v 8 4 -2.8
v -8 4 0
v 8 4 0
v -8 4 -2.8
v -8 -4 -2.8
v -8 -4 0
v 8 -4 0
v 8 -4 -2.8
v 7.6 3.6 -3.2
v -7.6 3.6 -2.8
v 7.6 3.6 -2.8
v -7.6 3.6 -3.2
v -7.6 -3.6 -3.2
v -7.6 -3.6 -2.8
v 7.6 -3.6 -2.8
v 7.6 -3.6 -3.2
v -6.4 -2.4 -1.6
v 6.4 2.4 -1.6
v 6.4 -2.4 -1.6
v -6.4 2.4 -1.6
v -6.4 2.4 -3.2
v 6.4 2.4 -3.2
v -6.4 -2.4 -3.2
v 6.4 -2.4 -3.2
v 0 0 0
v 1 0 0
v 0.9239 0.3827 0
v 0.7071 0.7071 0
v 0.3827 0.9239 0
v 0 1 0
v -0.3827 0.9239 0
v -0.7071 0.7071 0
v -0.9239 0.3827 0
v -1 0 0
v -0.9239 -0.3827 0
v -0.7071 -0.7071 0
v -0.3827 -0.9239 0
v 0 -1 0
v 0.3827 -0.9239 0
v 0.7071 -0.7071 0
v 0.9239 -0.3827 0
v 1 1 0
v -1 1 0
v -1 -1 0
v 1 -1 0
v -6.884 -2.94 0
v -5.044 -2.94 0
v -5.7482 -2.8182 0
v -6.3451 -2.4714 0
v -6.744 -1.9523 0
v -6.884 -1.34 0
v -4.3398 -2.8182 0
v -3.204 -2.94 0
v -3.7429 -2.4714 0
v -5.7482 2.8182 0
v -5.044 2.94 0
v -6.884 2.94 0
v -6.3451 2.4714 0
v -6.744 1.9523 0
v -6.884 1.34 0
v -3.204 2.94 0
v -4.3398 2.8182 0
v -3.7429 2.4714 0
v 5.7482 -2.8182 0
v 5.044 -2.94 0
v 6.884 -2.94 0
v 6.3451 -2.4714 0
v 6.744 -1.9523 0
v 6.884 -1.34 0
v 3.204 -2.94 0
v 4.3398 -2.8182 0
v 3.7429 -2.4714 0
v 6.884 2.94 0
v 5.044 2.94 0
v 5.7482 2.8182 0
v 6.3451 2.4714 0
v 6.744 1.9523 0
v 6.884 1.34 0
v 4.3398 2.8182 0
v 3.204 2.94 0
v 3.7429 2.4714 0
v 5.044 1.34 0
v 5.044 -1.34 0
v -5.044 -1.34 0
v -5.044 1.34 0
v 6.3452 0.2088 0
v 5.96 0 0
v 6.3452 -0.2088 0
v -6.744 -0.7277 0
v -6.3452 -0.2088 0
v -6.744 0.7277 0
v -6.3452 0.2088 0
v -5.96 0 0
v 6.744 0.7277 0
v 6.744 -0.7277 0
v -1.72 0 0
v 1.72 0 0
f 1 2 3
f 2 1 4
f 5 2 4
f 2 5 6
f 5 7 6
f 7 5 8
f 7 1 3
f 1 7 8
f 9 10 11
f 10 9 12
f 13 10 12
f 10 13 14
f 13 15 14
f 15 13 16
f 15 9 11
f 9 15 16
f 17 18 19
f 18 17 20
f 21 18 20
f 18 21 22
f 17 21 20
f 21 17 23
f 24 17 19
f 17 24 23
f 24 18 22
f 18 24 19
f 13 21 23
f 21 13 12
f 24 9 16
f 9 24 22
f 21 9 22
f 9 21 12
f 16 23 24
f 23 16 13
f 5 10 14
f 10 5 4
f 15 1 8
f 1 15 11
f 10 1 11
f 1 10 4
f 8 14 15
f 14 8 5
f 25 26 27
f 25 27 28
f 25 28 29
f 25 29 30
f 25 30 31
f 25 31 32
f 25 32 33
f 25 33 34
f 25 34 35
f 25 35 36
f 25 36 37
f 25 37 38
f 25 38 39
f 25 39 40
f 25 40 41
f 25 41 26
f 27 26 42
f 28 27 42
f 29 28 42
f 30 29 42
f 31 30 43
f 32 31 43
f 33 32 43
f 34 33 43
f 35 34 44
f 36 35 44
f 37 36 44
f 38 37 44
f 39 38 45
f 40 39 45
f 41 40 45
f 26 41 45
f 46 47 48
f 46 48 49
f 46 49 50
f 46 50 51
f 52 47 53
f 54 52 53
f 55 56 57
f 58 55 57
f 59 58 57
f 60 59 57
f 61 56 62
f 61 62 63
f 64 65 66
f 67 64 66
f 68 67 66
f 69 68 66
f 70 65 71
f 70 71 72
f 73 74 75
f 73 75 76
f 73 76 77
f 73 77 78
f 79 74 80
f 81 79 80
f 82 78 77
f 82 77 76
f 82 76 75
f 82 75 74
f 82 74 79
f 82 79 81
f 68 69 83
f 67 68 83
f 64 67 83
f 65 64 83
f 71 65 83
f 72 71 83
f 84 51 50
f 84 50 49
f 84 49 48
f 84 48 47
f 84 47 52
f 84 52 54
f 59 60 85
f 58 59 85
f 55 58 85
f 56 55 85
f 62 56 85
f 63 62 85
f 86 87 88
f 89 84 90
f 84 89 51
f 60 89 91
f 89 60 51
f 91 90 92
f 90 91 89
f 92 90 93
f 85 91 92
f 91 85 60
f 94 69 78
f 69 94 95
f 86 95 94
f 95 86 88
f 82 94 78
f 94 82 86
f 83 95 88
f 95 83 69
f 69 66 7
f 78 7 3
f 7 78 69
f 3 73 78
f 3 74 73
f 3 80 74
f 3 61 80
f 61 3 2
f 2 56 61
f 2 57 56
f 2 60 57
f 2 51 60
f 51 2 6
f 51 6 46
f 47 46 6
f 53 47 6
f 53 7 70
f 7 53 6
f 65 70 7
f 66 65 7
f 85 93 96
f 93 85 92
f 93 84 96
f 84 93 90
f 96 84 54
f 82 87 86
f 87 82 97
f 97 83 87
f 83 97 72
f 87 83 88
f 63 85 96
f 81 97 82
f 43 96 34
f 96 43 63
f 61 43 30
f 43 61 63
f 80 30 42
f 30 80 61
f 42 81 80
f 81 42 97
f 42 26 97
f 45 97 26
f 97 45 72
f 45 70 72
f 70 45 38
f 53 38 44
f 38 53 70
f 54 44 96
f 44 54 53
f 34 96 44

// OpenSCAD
// file: ../p/4-4edge.scad
use <../lib.scad>
$fa=1; $fs=0.2;
function ldraw_lib__4_4edge(realsolid=false) = [
// 0 Circle 1.0
// 0 Name: 4-4edge.dat
// 0 Author: James Jessiman
// 0 !LDRAW_ORG Primitive UPDATE 2017-01
// 0 !LICENSE Licensed under CC BY 2.0 and CC BY 4.0 : see CAreadme.txt
// 
// 0 BFC CERTIFY CCW
  [0,"BFC","CERTIFY"],
  [0,"BFC","CCW"],
// 
// 0 !HISTORY 1998-12-15 [PTadmin] Official Update 1998-10
// 0 !HISTORY 2005-12-28 [PTadmin] Official Update 2005-01
// 0 !HISTORY 2007-06-24 [PTadmin] Header formatted for Contributor Agreement
// 0 !HISTORY 2008-07-01 [PTadmin] Official Update 2008-01
// 0 !HISTORY 2017-01-15 [Steffen] BFCed
// 0 !HISTORY 2017-12-30 [PTadmin] Official Update 2017-01
// 
// 
// 2 24 1 0 0 0.9239 0 0.3827
  [2,24,1,0,0,0.9239,0,0.3827],
// 2 24 0.9239 0 0.3827 0.7071 0 0.7071
  [2,24,0.9239,0,0.3827,0.7071,0,0.7071],
// 2 24 0.7071 0 0.7071 0.3827 0 0.9239
  [2,24,0.7071,0,0.7071,0.3827,0,0.9239],
// 2 24 0.3827 0 0.9239 0 0 1
  [2,24,0.3827,0,0.9239,0,0,1],
// 2 24 0 0 1 -0.3827 0 0.9239
  [2,24,0,0,1,-0.3827,0,0.9239],
// 2 24 -0.3827 0 0.9239 -0.7071 0 0.7071
  [2,24,-0.3827,0,0.9239,-0.7071,0,0.7071],
// 2 24 -0.7071 0 0.7071 -0.9239 0 0.3827
  [2,24,-0.7071,0,0.7071,-0.9239,0,0.3827],
// 2 24 -0.9239 0 0.3827 -1 0 -0
  [2,24,-0.9239,0,0.3827,-1,0,-0],
// 2 24 -1 0 -0 -0.9239 0 -0.3827
  [2,24,-1,0,-0,-0.9239,0,-0.3827],
// 2 24 -0.9239 0 -0.3827 -0.7071 0 -0.7071
  [2,24,-0.9239,0,-0.3827,-0.7071,0,-0.7071],
// 2 24 -0.7071 0 -0.7071 -0.3827 0 -0.9239
  [2,24,-0.7071,0,-0.7071,-0.3827,0,-0.9239],
// 2 24 -0.3827 0 -0.9239 0 0 -1
  [2,24,-0.3827,0,-0.9239,0,0,-1],
// 2 24 0 0 -1 0.3827 0 -0.9239
  [2,24,0,0,-1,0.3827,0,-0.9239],
// 2 24 0.3827 0 -0.9239 0.7071 0 -0.7071
  [2,24,0.3827,0,-0.9239,0.7071,0,-0.7071],
// 2 24 0.7071 0 -0.7071 0.9239 0 -0.3827
  [2,24,0.7071,0,-0.7071,0.9239,0,-0.3827],
// 2 24 0.9239 0 -0.3827 1 0 0
  [2,24,0.9239,0,-0.3827,1,0,0],
];
module ldraw_lib__4_4edge(step=0, col=false, unit=2/5, alt=false, line=0.2, solid=!$preview)
    makepoly(ldraw_lib__4_4edge(solid), step=step, col=col, unit=unit, alt=alt, line=line, solid=solid);
ldraw_lib__4_4edge(line=0.2);
// file: ../p/4-4cyli.scad
use <../lib.scad>
$fa=1; $fs=0.2;
function ldraw_lib__4_4cyli(realsolid=false) = [
// 0 Cylinder 1.0
// 0 Name: 4-4cyli.dat
// 0 Author: James Jessiman
// 0 !LDRAW_ORG Primitive UPDATE 2005-01
// 0 !LICENSE Licensed under CC BY 2.0 and CC BY 4.0 : see CAreadme.txt
// 
// 0 BFC CERTIFY CCW
  [0,"BFC","CERTIFY"],
  [0,"BFC","CCW"],
// 
// 0 !HISTORY 1998-12-15 [PTadmin] Official Update 1998-10
// 0 !HISTORY 2002-03-23 [sbliss] Added BFC statement; merged headers from files in distributions LDraw 0.27 and Complete.
// 0 !HISTORY 2002-04-25 [PTadmin] Official Update 2002-02
// 0 !HISTORY 2004-12-14 [guyvivan] BFC CCW
// 0 !HISTORY 2005-12-28 [PTadmin] Official Update 2005-01
// 0 !HISTORY 2007-06-24 [PTadmin] Header formatted for Contributor Agreement
// 0 !HISTORY 2008-07-01 [PTadmin] Official Update 2008-01
// 
// 
// 4 16 1 1 0 0.9239 1 0.3827 0.9239 0 0.3827 1 0 0
  [4,16,1,1,0,0.9239,1,0.3827,0.9239,0,0.3827,1,0,0],
// 5 24 1 0 0 1 1 0 0.9239 0 0.3827 0.9239 0 -0.3827
  [5,24,1,0,0,1,1,0,0.9239,0,0.3827,0.9239,0,-0.3827],
// 4 16 0.9239 1 0.3827 0.7071 1 0.7071 0.7071 0 0.7071 0.9239 0 0.3827
  [4,16,0.9239,1,0.3827,0.7071,1,0.7071,0.7071,0,0.7071,0.9239,0,0.3827],
// 5 24 0.9239 0 0.3827 0.9239 1 0.3827 0.7071 0 0.7071 1 0 0
  [5,24,0.9239,0,0.3827,0.9239,1,0.3827,0.7071,0,0.7071,1,0,0],
// 4 16 0.7071 1 0.7071 0.3827 1 0.9239 0.3827 0 0.9239 0.7071 0 0.7071
  [4,16,0.7071,1,0.7071,0.3827,1,0.9239,0.3827,0,0.9239,0.7071,0,0.7071],
// 5 24 0.7071 0 0.7071 0.7071 1 0.7071 0.3827 0 0.9239 0.9239 0 0.3827
  [5,24,0.7071,0,0.7071,0.7071,1,0.7071,0.3827,0,0.9239,0.9239,0,0.3827],
// 4 16 0.3827 1 0.9239 0 1 1 0 0 1 0.3827 0 0.9239
  [4,16,0.3827,1,0.9239,0,1,1,0,0,1,0.3827,0,0.9239],
// 5 24 0.3827 0 0.9239 0.3827 1 0.9239 0 0 1 0.7071 0 0.7071
  [5,24,0.3827,0,0.9239,0.3827,1,0.9239,0,0,1,0.7071,0,0.7071],
// 4 16 0 1 1 -0.3827 1 0.9239 -0.3827 0 0.9239 0 0 1
  [4,16,0,1,1,-0.3827,1,0.9239,-0.3827,0,0.9239,0,0,1],
// 5 24 0 0 1 0 1 1 -0.3827 0 0.9239 0.3827 0 0.9239
  [5,24,0,0,1,0,1,1,-0.3827,0,0.9239,0.3827,0,0.9239],
// 4 16 -0.3827 1 0.9239 -0.7071 1 0.7071 -0.7071 0 0.7071 -0.3827 0 0.9239
  [4,16,-0.3827,1,0.9239,-0.7071,1,0.7071,-0.7071,0,0.7071,-0.3827,0,0.9239],
// 5 24 -0.3827 0 0.9239 -0.3827 1 0.9239 -0.7071 0 0.7071 0 0 1
  [5,24,-0.3827,0,0.9239,-0.3827,1,0.9239,-0.7071,0,0.7071,0,0,1],
// 4 16 -0.7071 1 0.7071 -0.9239 1 0.3827 -0.9239 0 0.3827 -0.7071 0 0.7071
  [4,16,-0.7071,1,0.7071,-0.9239,1,0.3827,-0.9239,0,0.3827,-0.7071,0,0.7071],
// 5 24 -0.7071 0 0.7071 -0.7071 1 0.7071 -0.9239 0 0.3827 -0.3827 0 0.9239
  [5,24,-0.7071,0,0.7071,-0.7071,1,0.7071,-0.9239,0,0.3827,-0.3827,0,0.9239],
// 4 16 -0.9239 1 0.3827 -1 1 0 -1 0 0 -0.9239 0 0.3827
  [4,16,-0.9239,1,0.3827,-1,1,0,-1,0,0,-0.9239,0,0.3827],
// 5 24 -0.9239 0 0.3827 -0.9239 1 0.3827 -1 0 0 -0.7071 0 0.7071
  [5,24,-0.9239,0,0.3827,-0.9239,1,0.3827,-1,0,0,-0.7071,0,0.7071],
// 4 16 -1 1 0 -0.9239 1 -0.3827 -0.9239 0 -0.3827 -1 0 0
  [4,16,-1,1,0,-0.9239,1,-0.3827,-0.9239,0,-0.3827,-1,0,0],
// 5 24 -1 0 0 -1 1 0 -0.9239 0 -0.3827 -0.9239 0 0.3827
  [5,24,-1,0,0,-1,1,0,-0.9239,0,-0.3827,-0.9239,0,0.3827],
// 4 16 -0.9239 1 -0.3827 -0.7071 1 -0.7071 -0.7071 0 -0.7071 -0.9239 0 -0.3827
  [4,16,-0.9239,1,-0.3827,-0.7071,1,-0.7071,-0.7071,0,-0.7071,-0.9239,0,-0.3827],
// 5 24 -0.9239 0 -0.3827 -0.9239 1 -0.3827 -0.7071 0 -0.7071 -1 0 0
  [5,24,-0.9239,0,-0.3827,-0.9239,1,-0.3827,-0.7071,0,-0.7071,-1,0,0],
// 4 16 -0.7071 1 -0.7071 -0.3827 1 -0.9239 -0.3827 0 -0.9239 -0.7071 0 -0.7071
  [4,16,-0.7071,1,-0.7071,-0.3827,1,-0.9239,-0.3827,0,-0.9239,-0.7071,0,-0.7071],
// 5 24 -0.7071 0 -0.7071 -0.7071 1 -0.7071 -0.3827 0 -0.9239 -0.9239 0 -0.3827
  [5,24,-0.7071,0,-0.7071,-0.7071,1,-0.7071,-0.3827,0,-0.9239,-0.9239,0,-0.3827],
// 4 16 -0.3827 1 -0.9239 0 1 -1 0 0 -1 -0.3827 0 -0.9239
  [4,16,-0.3827,1,-0.9239,0,1,-1,0,0,-1,-0.3827,0,-0.9239],
// 5 24 -0.3827 0 -0.9239 -0.3827 1 -0.9239 0 0 -1 -0.7071 0 -0.7071
  [5,24,-0.3827,0,-0.9239,-0.3827,1,-0.9239,0,0,-1,-0.7071,0,-0.7071],
// 4 16 0 1 -1 0.3827 1 -0.9239 0.3827 0 -0.9239 0 0 -1
  [4,16,0,1,-1,0.3827,1,-0.9239,0.3827,0,-0.9239,0,0,-1],
// 5 24 0 0 -1 0 1 -1 0.3827 0 -0.9239 -0.3827 0 -0.9239
  [5,24,0,0,-1,0,1,-1,0.3827,0,-0.9239,-0.3827,0,-0.9239],
// 4 16 0.3827 1 -0.9239 0.7071 1 -0.7071 0.7071 0 -0.7071 0.3827 0 -0.9239
  [4,16,0.3827,1,-0.9239,0.7071,1,-0.7071,0.7071,0,-0.7071,0.3827,0,-0.9239],
// 5 24 0.3827 0 -0.9239 0.3827 1 -0.9239 0.7071 0 -0.7071 0 0 -1
  [5,24,0.3827,0,-0.9239,0.3827,1,-0.9239,0.7071,0,-0.7071,0,0,-1],
// 4 16 0.7071 1 -0.7071 0.9239 1 -0.3827 0.9239 0 -0.3827 0.7071 0 -0.7071
  [4,16,0.7071,1,-0.7071,0.9239,1,-0.3827,0.9239,0,-0.3827,0.7071,0,-0.7071],
// 5 24 0.7071 0 -0.7071 0.7071 1 -0.7071 0.9239 0 -0.3827 0.3827 0 -0.9239
  [5,24,0.7071,0,-0.7071,0.7071,1,-0.7071,0.9239,0,-0.3827,0.3827,0,-0.9239],
// 4 16 0.9239 1 -0.3827 1 1 0 1 0 0 0.9239 0 -0.3827
  [4,16,0.9239,1,-0.3827,1,1,0,1,0,0,0.9239,0,-0.3827],
// 5 24 0.9239 0 -0.3827 0.9239 1 -0.3827 1 0 0 0.7071 0 -0.7071
  [5,24,0.9239,0,-0.3827,0.9239,1,-0.3827,1,0,0,0.7071,0,-0.7071],
// 0
];
module ldraw_lib__4_4cyli(step=0, col=false, unit=2/5, alt=false, line=0.2, solid=!$preview)
    makepoly(ldraw_lib__4_4cyli(solid), step=step, col=col, unit=unit, alt=alt, line=line, solid=solid);
ldraw_lib__4_4cyli(line=0.2);
// file: ../p/stud3.scad
use <../lib.scad>
use <4-4cyli.scad>
use <4-4disc.scad>
use <4-4edge.scad>
$fa=1; $fs=0.2;
function ldraw_lib__stud3(realsolid=false) = realsolid ? 
    [openscad(translate([0,0,-eps()], o=cylinder(4+eps(), r=4)),2)] : [
// 0 Stud Tube Solid
// 0 Name: stud3.dat
// 0 Author: James Jessiman
// 0 !LDRAW_ORG Primitive UPDATE 2012-01
// 0 !LICENSE Licensed under CC BY 2.0 and CC BY 4.0 : see CAreadme.txt
// 
// 0 BFC CERTIFY CCW
  [0,"BFC","CERTIFY"],
  [0,"BFC","CCW"],
// 
// 0 !HISTORY 2002-04-04 [sbliss] Modified for BFC compliance
// 0 !HISTORY 2002-04-25 [PTadmin] Official Update 2002-02
// 0 !HISTORY 2007-06-24 [PTadmin] Header formatted for Contributor Agreement
// 0 !HISTORY 2008-07-01 [PTadmin] Official Update 2008-01
// 0 !HISTORY 2012-02-16 [Philo] Changed to CCW
// 0 !HISTORY 2012-03-30 [PTadmin] Official Update 2012-01
// 
// 
// 1 16 0 -4 0 4 0 0 0 1 0 0 0 4 4-4edge.dat
  [1,16,0,-4,0,4,0,0,0,1,0,0,0,4, ldraw_lib__4_4edge(realsolid)],
// 1 16 0 0 0 4 0 0 0 1 0 0 0 4 4-4edge.dat
  [1,16,0,0,0,4,0,0,0,1,0,0,0,4, ldraw_lib__4_4edge(realsolid)],
// 1 16 0 -4 0 4 0 0 0 1 0 0 0 4 4-4disc.dat
  [1,16,0,-4,0,4,0,0,0,1,0,0,0,4, ldraw_lib__4_4disc(realsolid)],
// 1 16 0 -4 0 4 0 0 0 4 0 0 0 4 4-4cyli.dat
  [1,16,0,-4,0,4,0,0,0,4,0,0,0,4, ldraw_lib__4_4cyli(realsolid)],
];
module ldraw_lib__stud3(step=0, col=false, unit=2/5, alt=false, line=0.2, solid=!$preview)
    makepoly(ldraw_lib__stud3(solid), step=step, col=col, unit=unit, alt=alt, line=line, solid=solid);
ldraw_lib__stud3(line=0.2);
// file: ../p/stud.scad
use <../lib.scad>
use <4-4cyli.scad>
use <4-4disc.scad>
use <4-4edge.scad>
$fa=1; $fs=0.2;
function ldraw_lib__stud(realsolid=false) = realsolid ? 
    [openscad(translate([0,0,-eps()], o=cylinder(4+eps(), r=6)),2)] : [
// 0 Stud
// 0 Name: stud.dat
// 0 Author: James Jessiman
// 0 !LDRAW_ORG Primitive UPDATE 2012-01
// 0 !LICENSE Licensed under CC BY 2.0 and CC BY 4.0 : see CAreadme.txt
// 
// 0 BFC CERTIFY CCW
  [0,"BFC","CERTIFY"],
  [0,"BFC","CCW"],
// 
// 0 !HISTORY 2002-04-04 [sbliss] Modified for BFC compliance
// 0 !HISTORY 2002-04-25 [PTadmin] Official Update 2002-02
// 0 !HISTORY 2007-06-24 [PTadmin] Header formatted for Contributor Agreement
// 0 !HISTORY 2008-07-01 [PTadmin] Official Update 2008-01
// 0 !HISTORY 2012-02-16 [Philo] Changed to CCW
// 0 !HISTORY 2012-03-30 [PTadmin] Official Update 2012-01
// 
// 
// 1 16 0 0 0 6 0 0 0 1 0 0 0 6 4-4edge.dat
  [1,16,0,0,0,6,0,0,0,1,0,0,0,6, ldraw_lib__4_4edge(realsolid)],
// 1 16 0 -4 0 6 0 0 0 1 0 0 0 6 4-4edge.dat
  [1,16,0,-4,0,6,0,0,0,1,0,0,0,6, ldraw_lib__4_4edge(realsolid)],
// 1 16 0 0 0 6 0 0 0 -4 0 0 0 6 4-4cyli.dat
  [1,16,0,0,0,6,0,0,0,-4,0,0,0,6, ldraw_lib__4_4cyli(realsolid)],
// 1 16 0 -4 0 6 0 0 0 1 0 0 0 6 4-4disc.dat
  [1,16,0,-4,0,6,0,0,0,1,0,0,0,6, ldraw_lib__4_4disc(realsolid)],
];
module ldraw_lib__stud(step=0, col=false, unit=2/5, alt=false, line=0.2, solid=!$preview)
    makepoly(ldraw_lib__stud(solid), step=step, col=col, unit=unit, alt=alt, line=line, solid=solid);
ldraw_lib__stud(line=0.2);
// file: ../p/box4t.scad
use <../lib.scad>
$fa=1; $fs=0.2;
function ldraw_lib__box4t(realsolid=false) = [
// 0 Box with 4 Adjacent Faces and All Edges
// 0 Name: box4t.dat
// 0 Author: Tore Eriksson [Tore_Eriksson]
// 0 !LDRAW_ORG Primitive UPDATE 2003-02
// 0 !LICENSE Licensed under CC BY 2.0 and CC BY 4.0 : see CAreadme.txt
// 
// 0 BFC CERTIFY CCW
  [0,"BFC","CERTIFY"],
  [0,"BFC","CCW"],
// 
// 0 !HISTORY 1997-09-29 [PTadmin] Official Update 1997-15
// 0 !HISTORY 2002-08-31 [izanette] Modified with WINDZ for BFC compliance
// 0 !HISTORY 2003-08-01 [PTadmin] Official Update 2003-02
// 0 !HISTORY 2007-06-24 [PTadmin] Header formatted for Contributor Agreement
// 0 !HISTORY 2008-07-01 [PTadmin] Official Update 2008-01
// 
// 
// 2 24 1 1 1 -1 1 1
  [2,24,1,1,1,-1,1,1],
// 2 24 -1 1 1 -1 1 -1
  [2,24,-1,1,1,-1,1,-1],
// 2 24 -1 1 -1 1 1 -1
  [2,24,-1,1,-1,1,1,-1],
// 2 24 1 1 -1 1 1 1
  [2,24,1,1,-1,1,1,1],
// 2 24 1 0 1 -1 0 1
  [2,24,1,0,1,-1,0,1],
// 2 24 -1 0 1 -1 0 -1
  [2,24,-1,0,1,-1,0,-1],
// 2 24 -1 0 -1 1 0 -1
  [2,24,-1,0,-1,1,0,-1],
// 2 24 1 0 -1 1 0 1
  [2,24,1,0,-1,1,0,1],
// 2 24 1 0 1 1 1 1
  [2,24,1,0,1,1,1,1],
// 2 24 -1 0 1 -1 1 1
  [2,24,-1,0,1,-1,1,1],
// 2 24 1 0 -1 1 1 -1
  [2,24,1,0,-1,1,1,-1],
// 2 24 -1 0 -1 -1 1 -1
  [2,24,-1,0,-1,-1,1,-1],
// 4 16 1 1 1 1 1 -1 -1 1 -1 -1 1 1
  [4,16,1,1,1,1,1,-1,-1,1,-1,-1,1,1],
// 4 16 1 1 1 -1 1 1 -1 0 1 1 0 1
  [4,16,1,1,1,-1,1,1,-1,0,1,1,0,1],
// 4 16 -1 1 1 -1 1 -1 -1 0 -1 -1 0 1
  [4,16,-1,1,1,-1,1,-1,-1,0,-1,-1,0,1],
// 0 4 16 -1 1 -1 -1 0 -1 1 0 -1 1 1 -1
// 4 16 1 1 -1 1 1 1 1 0 1 1 0 -1
  [4,16,1,1,-1,1,1,1,1,0,1,1,0,-1],
// 0
];
module ldraw_lib__box4t(step=0, col=false, unit=2/5, alt=false, line=0.2, solid=!$preview)
    makepoly(ldraw_lib__box4t(solid), step=step, col=col, unit=unit, alt=alt, line=line, solid=solid);
ldraw_lib__box4t(line=0.2);
// file: s/3004s01.scad
use <../../lib.scad>
use <../../p/box4t.scad>
use <../../p/box5.scad>
use <../../p/stud.scad>
use <../../p/stud3.scad>
$fa=1; $fs=0.2;
function ldraw_lib__s__3004s01(realsolid=false) = [
// 0 ~Brick  1 x  2 without Front Face
// 0 Name: s\3004s01.dat
// 0 Author: James Jessiman
// 0 !LDRAW_ORG Subpart UPDATE 2003-03
// 0 !LICENSE Licensed under CC BY 2.0 and CC BY 4.0 : see CAreadme.txt
// 
// 0 BFC CERTIFY CCW
  [0,"BFC","CERTIFY"],
  [0,"BFC","CCW"],
// 
// 0 !HISTORY 2003-09-07 [jriley] Subfiling, BFC
// 0 !HISTORY 2003-12-19 [PTadmin] Official Update 2003-03
// 0 !HISTORY 2007-08-29 [PTadmin] Header formatted for Contributor Agreement
// 0 !HISTORY 2008-07-01 [PTadmin] Official Update 2008-01
// 
// 
// 1 16 0 4 0 1 0 0 0 -5 0 0 0 1 stud3.dat
  [1,16,0,4,0,1,0,0,0,-5,0,0,0,1, ldraw_lib__stud3(realsolid)],
// 0 BFC INVERTNEXT
  [0,"BFC","INVERTNEXT"],
// 1 16 0 24 0 16 0 0 0 -20 0 0 0 6 box5.dat
  [1,16,0,24,0,16,0,0,0,-20,0,0,0,6, ldraw_lib__box5(realsolid)],
// 4 16 20 24 10 16 24 6 -16 24 6 -20 24 10
  [4,16,20,24,10,16,24,6,-16,24,6,-20,24,10],
// 4 16 -20 24 10 -16 24 6 -16 24 -6 -20 24 -10
  [4,16,-20,24,10,-16,24,6,-16,24,-6,-20,24,-10],
// 4 16 -20 24 -10 -16 24 -6 16 24 -6 20 24 -10
  [4,16,-20,24,-10,-16,24,-6,16,24,-6,20,24,-10],
// 4 16 20 24 -10 16 24 -6 16 24 6 20 24 10
  [4,16,20,24,-10,16,24,-6,16,24,6,20,24,10],
// 1 16 0 24 0 20 0 0 0 -24 0 0 0 10 box4t.dat
  [1,16,0,24,0,20,0,0,0,-24,0,0,0,10, ldraw_lib__box4t(realsolid)],
// 1 16 10 0 0 1 0 0 0 1 0 0 0 1 stud.dat
  [1,16,10,0,0,1,0,0,0,1,0,0,0,1, ldraw_lib__stud(realsolid)],
// 1 16 -10 0 0 1 0 0 0 1 0 0 0 1 stud.dat
  [1,16,-10,0,0,1,0,0,0,1,0,0,0,1, ldraw_lib__stud(realsolid)],
// 0
];
module ldraw_lib__s__3004s01(step=0, col=false, unit=2/5, alt=false, line=0.2, solid=!$preview)
    makepoly(ldraw_lib__s__3004s01(solid), step=step, col=col, unit=unit, alt=alt, line=line, solid=solid);
ldraw_lib__s__3004s01(line=0.2);
// file: ../p/box5.scad
use <../lib.scad>
$fa=1; $fs=0.2;
function ldraw_lib__box5(realsolid=false) = [
// 0 Box with 5 Faces and All Edges
// 0 Name: box5.dat
// 0 Author: James Jessiman
// 0 !LDRAW_ORG Primitive UPDATE 2012-01
// 0 !LICENSE Licensed under CC BY 2.0 and CC BY 4.0 : see CAreadme.txt
// 
// 0 BFC CERTIFY CCW
  [0,"BFC","CERTIFY"],
  [0,"BFC","CCW"],
// 
// 0 !HISTORY 2002-04-03 [sbliss] Modified for BFC compliance
// 0 !HISTORY 2002-04-25 [PTadmin] Official Update 2002-02
// 0 !HISTORY 2007-06-24 [PTadmin] Header formatted for Contributor Agreement
// 0 !HISTORY 2008-07-01 [PTadmin] Official Update 2008-01
// 0 !HISTORY 2012-02-16 [Philo] Changed to CCW
// 0 !HISTORY 2012-03-30 [PTadmin] Official Update 2012-01
// 
// 
// 2 24 1 1 1 -1 1 1
  [2,24,1,1,1,-1,1,1],
// 2 24 -1 1 1 -1 1 -1
  [2,24,-1,1,1,-1,1,-1],
// 2 24 -1 1 -1 1 1 -1
  [2,24,-1,1,-1,1,1,-1],
// 2 24 1 1 -1 1 1 1
  [2,24,1,1,-1,1,1,1],
// 2 24 1 0 1 -1 0 1
  [2,24,1,0,1,-1,0,1],
// 2 24 -1 0 1 -1 0 -1
  [2,24,-1,0,1,-1,0,-1],
// 2 24 -1 0 -1 1 0 -1
  [2,24,-1,0,-1,1,0,-1],
// 2 24 1 0 -1 1 0 1
  [2,24,1,0,-1,1,0,1],
// 2 24 1 0 1 1 1 1
  [2,24,1,0,1,1,1,1],
// 2 24 -1 0 1 -1 1 1
  [2,24,-1,0,1,-1,1,1],
// 2 24 1 0 -1 1 1 -1
  [2,24,1,0,-1,1,1,-1],
// 2 24 -1 0 -1 -1 1 -1
  [2,24,-1,0,-1,-1,1,-1],
// 4 16 -1 1 1 1 1 1 1 1 -1 -1 1 -1
  [4,16,-1,1,1,1,1,1,1,1,-1,-1,1,-1],
// 4 16 -1 1 1 -1 0 1 1 0 1 1 1 1
  [4,16,-1,1,1,-1,0,1,1,0,1,1,1,1],
// 4 16 -1 1 -1 -1 0 -1 -1 0 1 -1 1 1
  [4,16,-1,1,-1,-1,0,-1,-1,0,1,-1,1,1],
// 4 16 1 1 -1 1 0 -1 -1 0 -1 -1 1 -1
  [4,16,1,1,-1,1,0,-1,-1,0,-1,-1,1,-1],
// 4 16 1 1 1 1 0 1 1 0 -1 1 1 -1
  [4,16,1,1,1,1,0,1,1,0,-1,1,1,-1],
];
module ldraw_lib__box5(step=0, col=false, unit=2/5, alt=false, line=0.2, solid=!$preview)
    makepoly(ldraw_lib__box5(solid), step=step, col=col, unit=unit, alt=alt, line=line, solid=solid);
ldraw_lib__box5(line=0.2);
// file: ../p/box4.scad
use <../lib.scad>
$fa=1; $fs=0.2;
function ldraw_lib__box4(realsolid=false) = [
// 0 Box with 4 Faces (2 Parallel Pairs) and All Edges
// 0 Name: box4.dat
// 0 Author: James Jessiman
// 0 !LDRAW_ORG Primitive UPDATE 2012-01
// 0 !LICENSE Licensed under CC BY 2.0 and CC BY 4.0 : see CAreadme.txt
// 
// 0 BFC CERTIFY CCW
  [0,"BFC","CERTIFY"],
  [0,"BFC","CCW"],
// 
// 0 !HISTORY 2002-04-03 [sbliss] Modified for BFC compliance
// 0 !HISTORY 2002-04-25 [PTadmin] Official Update 2002-02
// 0 !HISTORY 2007-06-24 [PTadmin] Header formatted for Contributor Agreement
// 0 !HISTORY 2008-07-01 [PTadmin] Official Update 2008-01
// 0 !HISTORY 2012-02-16 [Philo] Changed to CCW
// 0 !HISTORY 2012-03-30 [PTadmin] Official Update 2012-01
// 
// 
// 2 24 1 1 1 -1 1 1
  [2,24,1,1,1,-1,1,1],
// 2 24 -1 1 1 -1 1 -1
  [2,24,-1,1,1,-1,1,-1],
// 2 24 -1 1 -1 1 1 -1
  [2,24,-1,1,-1,1,1,-1],
// 2 24 1 1 -1 1 1 1
  [2,24,1,1,-1,1,1,1],
// 2 24 1 0 1 -1 0 1
  [2,24,1,0,1,-1,0,1],
// 2 24 -1 0 1 -1 0 -1
  [2,24,-1,0,1,-1,0,-1],
// 2 24 -1 0 -1 1 0 -1
  [2,24,-1,0,-1,1,0,-1],
// 2 24 1 0 -1 1 0 1
  [2,24,1,0,-1,1,0,1],
// 2 24 1 0 1 1 1 1
  [2,24,1,0,1,1,1,1],
// 2 24 -1 0 1 -1 1 1
  [2,24,-1,0,1,-1,1,1],
// 2 24 1 0 -1 1 1 -1
  [2,24,1,0,-1,1,1,-1],
// 2 24 -1 0 -1 -1 1 -1
  [2,24,-1,0,-1,-1,1,-1],
// 4 16 -1 1 1 -1 0 1 1 0 1 1 1 1
  [4,16,-1,1,1,-1,0,1,1,0,1,1,1,1],
// 4 16 -1 1 -1 -1 0 -1 -1 0 1 -1 1 1
  [4,16,-1,1,-1,-1,0,-1,-1,0,1,-1,1,1],
// 4 16 1 1 -1 1 0 -1 -1 0 -1 -1 1 -1
  [4,16,1,1,-1,1,0,-1,-1,0,-1,-1,1,-1],
// 4 16 1 1 1 1 0 1 1 0 -1 1 1 -1
  [4,16,1,1,1,1,0,1,1,0,-1,1,1,-1],
];
module ldraw_lib__box4(step=0, col=false, unit=2/5, alt=false, line=0.2, solid=!$preview)
    makepoly(ldraw_lib__box4(solid), step=step, col=col, unit=unit, alt=alt, line=line, solid=solid);
ldraw_lib__box4(line=0.2);
// file: 3004.scad
use <../lib.scad>
use <s/3004s01.scad>
$fa=1; $fs=0.2;
function ldraw_lib__3004(realsolid=false) = [
// 0 Brick  1 x  2
// 0 Name: 3004.dat
// 0 Author: James Jessiman
// 0 !LDRAW_ORG Part UPDATE 2022-05
// 0 !LICENSE Licensed under CC BY 2.0 and CC BY 4.0 : see CAreadme.txt
// 
// 0 BFC CERTIFY CCW
  [0,"BFC","CERTIFY"],
  [0,"BFC","CCW"],
// 
// 0 !HISTORY 2001-10-26 [PTadmin] Official Update 2001-01
// 0 !HISTORY 2002-05-07 {unknown} BFC Certification
// 0 !HISTORY 2002-06-11 [PTadmin] Official Update 2002-03
// 0 !HISTORY 2007-05-07 [PTadmin] Header formatted for Contributor Agreement
// 0 !HISTORY 2008-07-01 [PTadmin] Official Update 2008-01
// 0 !HISTORY 2022-08-04 [MagFors] Using subfile
// 0 !HISTORY 2022-09-15 [PTadmin] Official Update 2022-05
// 
// 
// 1 16 0 0 0 1 0 0 0 1 0 0 0 1 s\3004s01.dat
  [1,16,0,0,0,1,0,0,0,1,0,0,0,1, ldraw_lib__s__3004s01(realsolid)],
// 4 16 -20 24 -10 20 24 -10 20 0 -10 -20 0 -10
  [4,16,-20,24,-10,20,24,-10,20,0,-10,-20,0,-10],
];
module ldraw_lib__3004(step=0, col=false, unit=2/5, alt=false, line=0.2, solid=!$preview)
    makepoly(ldraw_lib__3004(solid), step=step, col=col, unit=unit, alt=alt, line=line, solid=solid);
ldraw_lib__3004(line=0.2);
// file: s/3069bs01.scad
use <../../lib.scad>
use <../../p/box4.scad>
use <../../p/box5.scad>
$fa=1; $fs=0.2;
function ldraw_lib__s__3069bs01(realsolid=false) = [
// 0 ~Tile  1 x  2 with Groove without Top Face
// 0 Name: s\3069bs01.dat
// 0 Author: Santeri Piippo [arezey]
// 0 !LDRAW_ORG Subpart UPDATE 2010-02
// 0 !LICENSE Licensed under CC BY 2.0 and CC BY 4.0 : see CAreadme.txt
// 
// 0 BFC CERTIFY CCW
  [0,"BFC","CERTIFY"],
  [0,"BFC","CCW"],
// 
// 0 !HISTORY 2010-07-05 [PTadmin] Official Update 2010-02
// 
// 
// 1 16 0 0 0 20 0 0 0 7 0 0 0 10 box4.dat
  [1,16,0,0,0,20,0,0,0,7,0,0,0,10, ldraw_lib__box4(realsolid)],
// 1 16 0 7 0 19 0 0 0 1 0 0 0 9 box4.dat
  [1,16,0,7,0,19,0,0,0,1,0,0,0,9, ldraw_lib__box4(realsolid)],
// 0 BFC INVERTNEXT
  [0,"BFC","INVERTNEXT"],
// 1 16 0 8 0 16 0 0 0 -4 0 0 0 6 box5.dat
  [1,16,0,8,0,16,0,0,0,-4,0,0,0,6, ldraw_lib__box5(realsolid)],
// 4 16 -19 8 9 -16 8 6 -16 8 -6 -19 8 -9
  [4,16,-19,8,9,-16,8,6,-16,8,-6,-19,8,-9],
// 4 16 19 8 -9 16 8 -6 16 8 6 19 8 9
  [4,16,19,8,-9,16,8,-6,16,8,6,19,8,9],
// 4 16 19 8 9 16 8 6 -16 8 6 -19 8 9
  [4,16,19,8,9,16,8,6,-16,8,6,-19,8,9],
// 4 16 -19 8 -9 -16 8 -6 16 8 -6 19 8 -9
  [4,16,-19,8,-9,-16,8,-6,16,8,-6,19,8,-9],
// 4 16 -20 7 10 -19 7 9 -19 7 -9 -20 7 -10
  [4,16,-20,7,10,-19,7,9,-19,7,-9,-20,7,-10],
// 4 16 20 7 -10 19 7 -9 19 7 9 20 7 10
  [4,16,20,7,-10,19,7,-9,19,7,9,20,7,10],
// 4 16 20 7 10 19 7 9 -19 7 9 -20 7 10
  [4,16,20,7,10,19,7,9,-19,7,9,-20,7,10],
// 4 16 -20 7 -10 -19 7 -9 19 7 -9 20 7 -10
  [4,16,-20,7,-10,-19,7,-9,19,7,-9,20,7,-10],
// 0 //
];
module ldraw_lib__s__3069bs01(step=0, col=false, unit=2/5, alt=false, line=0.2, solid=!$preview)
    makepoly(ldraw_lib__s__3069bs01(solid), step=step, col=col, unit=unit, alt=alt, line=line, solid=solid);
ldraw_lib__s__3069bs01(line=0.2);
// file: ../p/4-4ndis.scad
use <../lib.scad>
$fa=1; $fs=0.2;
function ldraw_lib__4_4ndis(realsolid=false) = [
// 0 Disc Negative 1.0
// 0 Name: 4-4ndis.dat
// 0 Author: James Jessiman
// 0 !LDRAW_ORG Primitive UPDATE 2012-01
// 0 !LICENSE Licensed under CC BY 2.0 and CC BY 4.0 : see CAreadme.txt
// 
// 0 BFC CERTIFY CCW
  [0,"BFC","CERTIFY"],
  [0,"BFC","CCW"],
// 
// 0 !HISTORY 2002-03-23 [sbliss] Added BFC statement; compacted code
// 0 !HISTORY 2002-04-25 [PTadmin] Official Update 2002-02
// 0 !HISTORY 2007-06-24 [PTadmin] Header formatted for Contributor Agreement
// 0 !HISTORY 2008-07-01 [PTadmin] Official Update 2008-01
// 0 !HISTORY 2012-02-16 [Philo] Changed to CCW
// 0 !HISTORY 2012-03-30 [PTadmin] Official Update 2012-01
// 
// 
// 3 16 0.9239 0 0.3827 1 0 0 1 0 1
  [3,16,0.9239,0,0.3827,1,0,0,1,0,1],
// 3 16 0.7071 0 0.7071 0.9239 0 0.3827 1 0 1
  [3,16,0.7071,0,0.7071,0.9239,0,0.3827,1,0,1],
// 3 16 0.3827 0 0.9239 0.7071 0 0.7071 1 0 1
  [3,16,0.3827,0,0.9239,0.7071,0,0.7071,1,0,1],
// 3 16 0 0 1 0.3827 0 0.9239 1 0 1
  [3,16,0,0,1,0.3827,0,0.9239,1,0,1],
// 3 16 -0.3827 0 0.9239 0 0 1 -1 0 1
  [3,16,-0.3827,0,0.9239,0,0,1,-1,0,1],
// 3 16 -0.7071 0 0.7071 -0.3827 0 0.9239 -1 0 1
  [3,16,-0.7071,0,0.7071,-0.3827,0,0.9239,-1,0,1],
// 3 16 -0.9239 0 0.3827 -0.7071 0 0.7071 -1 0 1
  [3,16,-0.9239,0,0.3827,-0.7071,0,0.7071,-1,0,1],
// 3 16 -1 0 0 -0.9239 0 0.3827 -1 0 1
  [3,16,-1,0,0,-0.9239,0,0.3827,-1,0,1],
// 3 16 -0.9239 0 -0.3827 -1 0 0 -1 0 -1
  [3,16,-0.9239,0,-0.3827,-1,0,0,-1,0,-1],
// 3 16 -0.7071 0 -0.7071 -0.9239 0 -0.3827 -1 0 -1
  [3,16,-0.7071,0,-0.7071,-0.9239,0,-0.3827,-1,0,-1],
// 3 16 -0.3827 0 -0.9239 -0.7071 0 -0.7071 -1 0 -1
  [3,16,-0.3827,0,-0.9239,-0.7071,0,-0.7071,-1,0,-1],
// 3 16 0 0 -1 -0.3827 0 -0.9239 -1 0 -1
  [3,16,0,0,-1,-0.3827,0,-0.9239,-1,0,-1],
// 3 16 0.3827 0 -0.9239 0 0 -1 1 0 -1
  [3,16,0.3827,0,-0.9239,0,0,-1,1,0,-1],
// 3 16 0.7071 0 -0.7071 0.3827 0 -0.9239 1 0 -1
  [3,16,0.7071,0,-0.7071,0.3827,0,-0.9239,1,0,-1],
// 3 16 0.9239 0 -0.3827 0.7071 0 -0.7071 1 0 -1
  [3,16,0.9239,0,-0.3827,0.7071,0,-0.7071,1,0,-1],
// 3 16 1 0 0 0.9239 0 -0.3827 1 0 -1
  [3,16,1,0,0,0.9239,0,-0.3827,1,0,-1],
];
module ldraw_lib__4_4ndis(step=0, col=false, unit=2/5, alt=false, line=0.2, solid=!$preview)
    makepoly(ldraw_lib__4_4ndis(solid), step=step, col=col, unit=unit, alt=alt, line=line, solid=solid);
ldraw_lib__4_4ndis(line=0.2);
// file: ../p/4-4disc.scad
use <../lib.scad>
$fa=1; $fs=0.2;
function ldraw_lib__4_4disc(realsolid=false) = [
// 0 Disc 1.0
// 0 Name: 4-4disc.dat
// 0 Author: James Jessiman
// 0 !LDRAW_ORG Primitive UPDATE 2002-02
// 0 !LICENSE Licensed under CC BY 2.0 and CC BY 4.0 : see CAreadme.txt
// 
// 0 BFC CERTIFY CCW
  [0,"BFC","CERTIFY"],
  [0,"BFC","CCW"],
// 
// 0 !HISTORY 1998-12-15 [PTadmin] Official Update 1998-10
// 0 !HISTORY 2002-03-23 [sbliss] Added BFC statement
// 0 !HISTORY 2002-04-25 [PTadmin] Official Update 2002-02
// 0 !HISTORY 2007-06-24 [PTadmin] Header formatted for Contributor Agreement
// 0 !HISTORY 2008-07-01 [PTadmin] Official Update 2008-01
// 
// 
// 3 16 0 0 0 1 0 0 0.9239 0 0.3827
  [3,16,0,0,0,1,0,0,0.9239,0,0.3827],
// 3 16 0 0 0 0.9239 0 0.3827 0.7071 0 0.7071
  [3,16,0,0,0,0.9239,0,0.3827,0.7071,0,0.7071],
// 3 16 0 0 0 0.7071 0 0.7071 0.3827 0 0.9239
  [3,16,0,0,0,0.7071,0,0.7071,0.3827,0,0.9239],
// 3 16 0 0 0 0.3827 0 0.9239 0 0 1
  [3,16,0,0,0,0.3827,0,0.9239,0,0,1],
// 3 16 0 0 0 0 0 1 -0.3827 0 0.9239
  [3,16,0,0,0,0,0,1,-0.3827,0,0.9239],
// 3 16 0 0 0 -0.3827 0 0.9239 -0.7071 0 0.7071
  [3,16,0,0,0,-0.3827,0,0.9239,-0.7071,0,0.7071],
// 3 16 0 0 0 -0.7071 0 0.7071 -0.9239 0 0.3827
  [3,16,0,0,0,-0.7071,0,0.7071,-0.9239,0,0.3827],
// 3 16 0 0 0 -0.9239 0 0.3827 -1 0 -0
  [3,16,0,0,0,-0.9239,0,0.3827,-1,0,-0],
// 3 16 0 0 0 -1 0 -0 -0.9239 0 -0.3827
  [3,16,0,0,0,-1,0,-0,-0.9239,0,-0.3827],
// 3 16 0 0 0 -0.9239 0 -0.3827 -0.7071 0 -0.7071
  [3,16,0,0,0,-0.9239,0,-0.3827,-0.7071,0,-0.7071],
// 3 16 0 0 0 -0.7071 0 -0.7071 -0.3827 0 -0.9239
  [3,16,0,0,0,-0.7071,0,-0.7071,-0.3827,0,-0.9239],
// 3 16 0 0 0 -0.3827 0 -0.9239 0 0 -1
  [3,16,0,0,0,-0.3827,0,-0.9239,0,0,-1],
// 3 16 0 0 0 0 0 -1 0.3827 0 -0.9239
  [3,16,0,0,0,0,0,-1,0.3827,0,-0.9239],
// 3 16 0 0 0 0.3827 0 -0.9239 0.7071 0 -0.7071
  [3,16,0,0,0,0.3827,0,-0.9239,0.7071,0,-0.7071],
// 3 16 0 0 0 0.7071 0 -0.7071 0.9239 0 -0.3827
  [3,16,0,0,0,0.7071,0,-0.7071,0.9239,0,-0.3827],
// 3 16 0 0 0 0.9239 0 -0.3827 1 0 0
  [3,16,0,0,0,0.9239,0,-0.3827,1,0,0],
// 0
];
module ldraw_lib__4_4disc(step=0, col=false, unit=2/5, alt=false, line=0.2, solid=!$preview)
    makepoly(ldraw_lib__4_4disc(solid), step=step, col=col, unit=unit, alt=alt, line=line, solid=solid);
ldraw_lib__4_4disc(line=0.2);
// file: ../p/3-8disc.scad
use <../lib.scad>
$fa=1; $fs=0.2;
function ldraw_lib__3_8disc(realsolid=false) = [
// 0 Disc 0.375
// 0 Name: 3-8disc.dat
// 0 Author: Guy Vivan [guyvivan]
// 0 !LDRAW_ORG Primitive UPDATE 2009-01
// 0 !LICENSE Licensed under CC BY 2.0 and CC BY 4.0 : see CAreadme.txt
// 
// 0 BFC CERTIFY CCW
  [0,"BFC","CERTIFY"],
  [0,"BFC","CCW"],
// 
// 0 !HISTORY 2009-05-02 [PTadmin] Official Update 2009-01
// 
// 
// 3 16 0 0 0 1 0 0 0.9239 0 0.3827
  [3,16,0,0,0,1,0,0,0.9239,0,0.3827],
// 3 16 0 0 0 0.9239 0 0.3827 0.7071 0 0.7071
  [3,16,0,0,0,0.9239,0,0.3827,0.7071,0,0.7071],
// 3 16 0 0 0 0.7071 0 0.7071 0.3827 0 0.9239
  [3,16,0,0,0,0.7071,0,0.7071,0.3827,0,0.9239],
// 3 16 0 0 0 0.3827 0 0.9239 0 0 1
  [3,16,0,0,0,0.3827,0,0.9239,0,0,1],
// 3 16 0 0 0 0 0 1 -0.3827 0 0.9239
  [3,16,0,0,0,0,0,1,-0.3827,0,0.9239],
// 3 16 0 0 0 -0.3827 0 0.9239 -0.7071 0 0.7071
  [3,16,0,0,0,-0.3827,0,0.9239,-0.7071,0,0.7071],
// 
// 0 end of file
// 
];
module ldraw_lib__3_8disc(step=0, col=false, unit=2/5, alt=false, line=0.2, solid=!$preview)
    makepoly(ldraw_lib__3_8disc(solid), step=step, col=col, unit=unit, alt=alt, line=line, solid=solid);
ldraw_lib__3_8disc(line=0.2);
// file: ../p/1-8ndis.scad
use <../lib.scad>
$fa=1; $fs=0.2;
function ldraw_lib__1_8ndis(realsolid=false) = [
// 0 Disc Negative 0.125
// 0 Name: 1-8ndis.dat
// 0 Author: James Jessiman
// 0 !LDRAW_ORG Primitive UPDATE 2012-01
// 0 !LICENSE Licensed under CC BY 2.0 and CC BY 4.0 : see CAreadme.txt
// 
// 0 BFC CERTIFY CCW
  [0,"BFC","CERTIFY"],
  [0,"BFC","CCW"],
// 
// 0 !HISTORY 2002-03-23 [sbliss] Added BFC statement
// 0 !HISTORY 2002-04-25 [PTadmin] Official Update 2002-02
// 0 !HISTORY 2007-06-22 [PTadmin] Header formatted for Contributor Agreement
// 0 !HISTORY 2008-07-01 [PTadmin] Official Update 2008-01
// 0 !HISTORY 2012-02-16 [Philo] Changed to CCW
// 0 !HISTORY 2012-03-30 [PTadmin] Official Update 2012-01
// 
// 
// 3 16 0.9239 0 0.3827 1 0 0 1 0 1
  [3,16,0.9239,0,0.3827,1,0,0,1,0,1],
// 3 16 0.7071 0 0.7071 0.9239 0 0.3827 1 0 1
  [3,16,0.7071,0,0.7071,0.9239,0,0.3827,1,0,1],
];
module ldraw_lib__1_8ndis(step=0, col=false, unit=2/5, alt=false, line=0.2, solid=!$preview)
    makepoly(ldraw_lib__1_8ndis(solid), step=step, col=col, unit=unit, alt=alt, line=line, solid=solid);
ldraw_lib__1_8ndis(line=0.2);
// file: ../p/1-4ndis.scad
use <../lib.scad>
$fa=1; $fs=0.2;
function ldraw_lib__1_4ndis(realsolid=false) = [
// 0 Disc Negative 0.25
// 0 Name: 1-4ndis.dat
// 0 Author: James Jessiman
// 0 !LDRAW_ORG Primitive UPDATE 2012-01
// 0 !LICENSE Licensed under CC BY 2.0 and CC BY 4.0 : see CAreadme.txt
// 
// 0 BFC CERTIFY CCW
  [0,"BFC","CERTIFY"],
  [0,"BFC","CCW"],
// 
// 0 !HISTORY 2002-03-23 [sbliss] Added BFC Statement
// 0 !HISTORY 2002-04-25 [PTadmin] Official Update 2002-02
// 0 !HISTORY 2007-06-22 [PTadmin] Header formatted for Contributor Agreement
// 0 !HISTORY 2008-07-01 [PTadmin] Official Update 2008-01
// 0 !HISTORY 2012-02-16 [Philo] Changed to CCW
// 0 !HISTORY 2012-03-30 [PTadmin] Official Update 2012-01
// 
// 
// 3 16 0.9239 0 0.3827 1 0 0 1 0 1
  [3,16,0.9239,0,0.3827,1,0,0,1,0,1],
// 3 16 0.7071 0 0.7071 0.9239 0 0.3827 1 0 1
  [3,16,0.7071,0,0.7071,0.9239,0,0.3827,1,0,1],
// 3 16 0.3827 0 0.9239 0.7071 0 0.7071 1 0 1
  [3,16,0.3827,0,0.9239,0.7071,0,0.7071,1,0,1],
// 3 16 0 0 1 0.3827 0 0.9239 1 0 1
  [3,16,0,0,1,0.3827,0,0.9239,1,0,1],
];
module ldraw_lib__1_4ndis(step=0, col=false, unit=2/5, alt=false, line=0.2, solid=!$preview)
    makepoly(ldraw_lib__1_4ndis(solid), step=step, col=col, unit=unit, alt=alt, line=line, solid=solid);
ldraw_lib__1_4ndis(line=0.2);
// main file
use <../lib.scad>
use <../p/1-4ndis.scad>
use <../p/1-8ndis.scad>
use <../p/3-8disc.scad>
use <../p/4-4disc.scad>
use <../p/4-4ndis.scad>
use <s/3069bs01.scad>
$fa=1; $fs=0.2;
function ldraw_lib__3069bpf5(realsolid=false) = [
// 0 Tile  1 x  2 with Purple Hearts on White Pattern
// 0 Name: 3069bpf5.dat
// 0 Author: Steffen [Steffen]
// 0 !LDRAW_ORG Part UPDATE 2019-01
// 0 !LICENSE Licensed under CC BY 2.0 and CC BY 4.0 : see CAreadme.txt
// 
// 0 BFC CERTIFY CCW
  [0,"BFC","CERTIFY"],
  [0,"BFC","CCW"],
// 
// 0 !KEYWORDS Scala, set 4307
// 
// 0 !HISTORY 2018-01-21 [Steffen] created based on 3069bpf3 by Niels Karsdorp [nielsk]
// 0 !HISTORY 2019-06-28 [PTadmin] Official Update 2019-01
// 
// 
// 1 16 0 0 0 1 0 0 0 1 0 0 0 1 s\3069bs01.dat
  [1,16,0,0,0,1,0,0,0,1,0,0,0,1, ldraw_lib__s__3069bs01(realsolid)],
// 
// 1 22 0 0 0 2.5 0 0 0 1 0 0 0 2.5 4-4disc.dat
  [1,22,0,0,0,2.5,0,0,0,1,0,0,0,2.5, ldraw_lib__4_4disc(realsolid)],
// 1 15 0 0 0 2.5 0 0 0 1 0 0 0 2.5 4-4ndis.dat
  [1,15,0,0,0,2.5,0,0,0,1,0,0,0,2.5, ldraw_lib__4_4ndis(realsolid)],
// 1 15 -12.61 0 -3.35 0 0 -4.6 0 1 0 -4 0 0 1-4ndis.dat
  [1,15,-12.61,0,-3.35,0,0,-4.6,0,1,0,-4,0,0, ldraw_lib__1_4ndis(realsolid)],
// 1 15 -12.61 0 -3.35 0 0 4.6 0 1 0 -4 0 0 1-8ndis.dat
  [1,15,-12.61,0,-3.35,0,0,4.6,0,1,0,-4,0,0, ldraw_lib__1_8ndis(realsolid)],
// 1 15 -12.61 0 3.35 0 0 -4.6 0 1 0 4 0 0 1-4ndis.dat
  [1,15,-12.61,0,3.35,0,0,-4.6,0,1,0,4,0,0, ldraw_lib__1_4ndis(realsolid)],
// 1 15 -12.61 0 3.35 0 0 4.6 0 1 0 4 0 0 1-8ndis.dat
  [1,15,-12.61,0,3.35,0,0,4.6,0,1,0,4,0,0, ldraw_lib__1_8ndis(realsolid)],
// 1 15 12.61 0 -3.35 0 0 4.6 0 1 0 -4 0 0 1-4ndis.dat
  [1,15,12.61,0,-3.35,0,0,4.6,0,1,0,-4,0,0, ldraw_lib__1_4ndis(realsolid)],
// 1 15 12.61 0 -3.35 0 0 -4.6 0 1 0 -4 0 0 1-8ndis.dat
  [1,15,12.61,0,-3.35,0,0,-4.6,0,1,0,-4,0,0, ldraw_lib__1_8ndis(realsolid)],
// 1 15 12.61 0 3.35 0 0 4.6 0 1 0 4 0 0 1-4ndis.dat
  [1,15,12.61,0,3.35,0,0,4.6,0,1,0,4,0,0, ldraw_lib__1_4ndis(realsolid)],
// 1 15 12.61 0 3.35 0 0 -4.6 0 1 0 4 0 0 1-8ndis.dat
  [1,15,12.61,0,3.35,0,0,-4.6,0,1,0,4,0,0, ldraw_lib__1_8ndis(realsolid)],
// 1 22 12.61 0 3.35 4.6 0 0 0 1 0 0 0 4 3-8disc.dat
  [1,22,12.61,0,3.35,4.6,0,0,0,1,0,0,0,4, ldraw_lib__3_8disc(realsolid)],
// 1 22 12.61 0 -3.35 4.6 0 0 0 1 0 0 0 -4 3-8disc.dat
  [1,22,12.61,0,-3.35,4.6,0,0,0,1,0,0,0,-4, ldraw_lib__3_8disc(realsolid)],
// 1 22 -12.61 0 -3.35 -4.6 0 0 0 1 0 0 0 -4 3-8disc.dat
  [1,22,-12.61,0,-3.35,-4.6,0,0,0,1,0,0,0,-4, ldraw_lib__3_8disc(realsolid)],
// 1 22 -12.61 0 3.35 -4.6 0 0 0 1 0 0 0 4 3-8disc.dat
  [1,22,-12.61,0,3.35,-4.6,0,0,0,1,0,0,0,4, ldraw_lib__3_8disc(realsolid)],
// 3 15 15.863 0 0.522 14.9 0 0 15.863 0 -0.522
  [3,15,15.863,0,0.522,14.9,0,0,15.863,0,-0.522],
// 4 22 -16.85994 0 -1.8192 -17.21 0 -3.35 -12.61 0 -3.35 -15.863 0 -0.522
  [4,22,-16.85994,0,-1.8192,-17.21,0,-3.35,-12.61,0,-3.35,-15.863,0,-0.522],
// 4 15 -16.85994 0 1.8192 -17.21 0 3.35 -17.21 0 -3.35 -16.85994 0 -1.8192
  [4,15,-16.85994,0,1.8192,-17.21,0,3.35,-17.21,0,-3.35,-16.85994,0,-1.8192],
// 4 15 -15.863 0 0.522 -16.85994 0 1.8192 -16.85994 0 -1.8192 -15.863 0 -0.522
  [4,15,-15.863,0,0.522,-16.85994,0,1.8192,-16.85994,0,-1.8192,-15.863,0,-0.522],
// 3 15 -15.863 0 0.522 -15.863 0 -0.522 -14.9 0 0
  [3,15,-15.863,0,0.522,-15.863,0,-0.522,-14.9,0,0],
// 4 22 -12.61 0 3.35 -17.21 0 3.35 -16.85994 0 1.8192 -15.863 0 0.522
  [4,22,-12.61,0,3.35,-17.21,0,3.35,-16.85994,0,1.8192,-15.863,0,0.522],
// 4 15 16.85994 0 -1.8192 17.21 0 -3.35 17.21 0 3.35 16.85994 0 1.8192
  [4,15,16.85994,0,-1.8192,17.21,0,-3.35,17.21,0,3.35,16.85994,0,1.8192],
// 4 15 15.863 0 -0.522 16.85994 0 -1.8192 16.85994 0 1.8192 15.863 0 0.522
  [4,15,15.863,0,-0.522,16.85994,0,-1.8192,16.85994,0,1.8192,15.863,0,0.522],
// 4 22 16.85994 0 1.8192 17.21 0 3.35 12.61 0 3.35 15.863 0 0.522
  [4,22,16.85994,0,1.8192,17.21,0,3.35,12.61,0,3.35,15.863,0,0.522],
// 4 22 12.61 0 -3.35 17.21 0 -3.35 16.85994 0 -1.8192 15.863 0 -0.522
  [4,22,12.61,0,-3.35,17.21,0,-3.35,16.85994,0,-1.8192,15.863,0,-0.522],
// 3 15 17.21 0 -3.35 17.21 0 -7.35 20 0 -10
  [3,15,17.21,0,-3.35,17.21,0,-7.35,20,0,-10],
// 4 15 17.21 0 3.35 17.21 0 -3.35 20 0 -10 20 0 10
  [4,15,17.21,0,3.35,17.21,0,-3.35,20,0,-10,20,0,10],
// 3 15 20 0 10 17.21 0 7.35 17.21 0 3.35
  [3,15,20,0,10,17.21,0,7.35,17.21,0,3.35],
// 3 15 20 0 10 12.61 0 7.35 17.21 0 7.35
  [3,15,20,0,10,12.61,0,7.35,17.21,0,7.35],
// 3 15 20 0 10 8.01 0 7.35 12.61 0 7.35
  [3,15,20,0,10,8.01,0,7.35,12.61,0,7.35],
// 4 15 -8.01 0 7.35 8.01 0 7.35 20 0 10 -20 0 10
  [4,15,-8.01,0,7.35,8.01,0,7.35,20,0,10,-20,0,10],
// 3 15 -20 0 10 -12.61 0 7.35 -8.01 0 7.35
  [3,15,-20,0,10,-12.61,0,7.35,-8.01,0,7.35],
// 3 15 -20 0 10 -17.21 0 7.35 -12.61 0 7.35
  [3,15,-20,0,10,-17.21,0,7.35,-12.61,0,7.35],
// 3 15 -20 0 10 -17.21 0 3.35 -17.21 0 7.35
  [3,15,-20,0,10,-17.21,0,3.35,-17.21,0,7.35],
// 4 15 -17.21 0 -3.35 -17.21 0 3.35 -20 0 10 -20 0 -10
  [4,15,-17.21,0,-3.35,-17.21,0,3.35,-20,0,10,-20,0,-10],
// 3 15 -17.21 0 -3.35 -20 0 -10 -17.21 0 -7.35
  [3,15,-17.21,0,-3.35,-20,0,-10,-17.21,0,-7.35],
// 3 15 -12.61 0 -7.35 -17.21 0 -7.35 -20 0 -10
  [3,15,-12.61,0,-7.35,-17.21,0,-7.35,-20,0,-10],
// 3 15 -8.01 0 -7.35 -12.61 0 -7.35 -20 0 -10
  [3,15,-8.01,0,-7.35,-12.61,0,-7.35,-20,0,-10],
// 4 15 8.01 0 -7.35 -8.01 0 -7.35 -20 0 -10 20 0 -10
  [4,15,8.01,0,-7.35,-8.01,0,-7.35,-20,0,-10,20,0,-10],
// 3 15 12.61 0 -7.35 8.01 0 -7.35 20 0 -10
  [3,15,12.61,0,-7.35,8.01,0,-7.35,20,0,-10],
// 3 15 17.21 0 -7.35 12.61 0 -7.35 20 0 -10
  [3,15,17.21,0,-7.35,12.61,0,-7.35,20,0,-10],
// 4 22 -15.863 0 0.522 -14.9 0 0 -4.3 0 0 -12.61 0 3.35
  [4,22,-15.863,0,0.522,-14.9,0,0,-4.3,0,0,-12.61,0,3.35],
// 4 22 -12.61 0 -3.35 -4.3 0 0 -14.9 0 0 -15.863 0 -0.522
  [4,22,-12.61,0,-3.35,-4.3,0,0,-14.9,0,0,-15.863,0,-0.522],
// 3 22 -4.3 0 0 -12.61 0 -3.35 -9.35734 0 -6.1784
  [3,22,-4.3,0,0,-12.61,0,-3.35,-9.35734,0,-6.1784],
// 4 22 14.9 0 0 15.863 0 0.522 12.61 0 3.35 4.3 0 0
  [4,22,14.9,0,0,15.863,0,0.522,12.61,0,3.35,4.3,0,0],
// 4 22 9.35734 0 -6.1784 12.61 0 -3.35 14.9 0 0 4.3 0 0
  [4,22,9.35734,0,-6.1784,12.61,0,-3.35,14.9,0,0,4.3,0,0],
// 3 22 14.9 0 0 12.61 0 -3.35 15.863 0 -0.522
  [3,22,14.9,0,0,12.61,0,-3.35,15.863,0,-0.522],
// 3 22 -9.35734 0 6.1784 -12.61 0 3.35 -4.3 0 0
  [3,22,-9.35734,0,6.1784,-12.61,0,3.35,-4.3,0,0],
// 3 22 9.35734 0 6.1784 4.3 0 0 12.61 0 3.35
  [3,22,9.35734,0,6.1784,4.3,0,0,12.61,0,3.35],
// 4 15 -4.3 0 0 -2.5 0 0 -2.5 0 2.5 -9.35734 0 6.1784
  [4,15,-4.3,0,0,-2.5,0,0,-2.5,0,2.5,-9.35734,0,6.1784],
// 4 15 -8.01 0 7.35 -9.35734 0 6.1784 -2.5 0 2.5 0 0 2.5
  [4,15,-8.01,0,7.35,-9.35734,0,6.1784,-2.5,0,2.5,0,0,2.5],
// 4 15 -8.01 0 7.35 0 0 2.5 2.5 0 2.5 8.01 0 7.35
  [4,15,-8.01,0,7.35,0,0,2.5,2.5,0,2.5,8.01,0,7.35],
// 4 15 9.35734 0 6.1784 8.01 0 7.35 2.5 0 2.5 4.3 0 0
  [4,15,9.35734,0,6.1784,8.01,0,7.35,2.5,0,2.5,4.3,0,0],
// 3 15 2.5 0 2.5 2.5 0 0 4.3 0 0
  [3,15,2.5,0,2.5,2.5,0,0,4.3,0,0],
// 4 15 4.3 0 0 2.5 0 0 2.5 0 -2.5 9.35734 0 -6.1784
  [4,15,4.3,0,0,2.5,0,0,2.5,0,-2.5,9.35734,0,-6.1784],
// 4 15 2.5 0 -2.5 0 0 -2.5 8.01 0 -7.35 9.35734 0 -6.1784
  [4,15,2.5,0,-2.5,0,0,-2.5,8.01,0,-7.35,9.35734,0,-6.1784],
// 4 15 8.01 0 -7.35 0 0 -2.5 -2.5 0 -2.5 -8.01 0 -7.35
  [4,15,8.01,0,-7.35,0,0,-2.5,-2.5,0,-2.5,-8.01,0,-7.35],
// 4 15 -9.35734 0 -6.1784 -8.01 0 -7.35 -2.5 0 -2.5 -4.3 0 0
  [4,15,-9.35734,0,-6.1784,-8.01,0,-7.35,-2.5,0,-2.5,-4.3,0,0],
// 3 15 -2.5 0 0 -4.3 0 0 -2.5 0 -2.5
  [3,15,-2.5,0,0,-4.3,0,0,-2.5,0,-2.5],
];
module ldraw_lib__3069bpf5(step=0, col=false, unit=2/5, alt=false, line=0.2, solid=!$preview)
    makepoly(ldraw_lib__3069bpf5(solid), step=step, col=col, unit=unit, alt=alt, line=line, solid=solid);
ldraw_lib__3069bpf5(line=0.2);
